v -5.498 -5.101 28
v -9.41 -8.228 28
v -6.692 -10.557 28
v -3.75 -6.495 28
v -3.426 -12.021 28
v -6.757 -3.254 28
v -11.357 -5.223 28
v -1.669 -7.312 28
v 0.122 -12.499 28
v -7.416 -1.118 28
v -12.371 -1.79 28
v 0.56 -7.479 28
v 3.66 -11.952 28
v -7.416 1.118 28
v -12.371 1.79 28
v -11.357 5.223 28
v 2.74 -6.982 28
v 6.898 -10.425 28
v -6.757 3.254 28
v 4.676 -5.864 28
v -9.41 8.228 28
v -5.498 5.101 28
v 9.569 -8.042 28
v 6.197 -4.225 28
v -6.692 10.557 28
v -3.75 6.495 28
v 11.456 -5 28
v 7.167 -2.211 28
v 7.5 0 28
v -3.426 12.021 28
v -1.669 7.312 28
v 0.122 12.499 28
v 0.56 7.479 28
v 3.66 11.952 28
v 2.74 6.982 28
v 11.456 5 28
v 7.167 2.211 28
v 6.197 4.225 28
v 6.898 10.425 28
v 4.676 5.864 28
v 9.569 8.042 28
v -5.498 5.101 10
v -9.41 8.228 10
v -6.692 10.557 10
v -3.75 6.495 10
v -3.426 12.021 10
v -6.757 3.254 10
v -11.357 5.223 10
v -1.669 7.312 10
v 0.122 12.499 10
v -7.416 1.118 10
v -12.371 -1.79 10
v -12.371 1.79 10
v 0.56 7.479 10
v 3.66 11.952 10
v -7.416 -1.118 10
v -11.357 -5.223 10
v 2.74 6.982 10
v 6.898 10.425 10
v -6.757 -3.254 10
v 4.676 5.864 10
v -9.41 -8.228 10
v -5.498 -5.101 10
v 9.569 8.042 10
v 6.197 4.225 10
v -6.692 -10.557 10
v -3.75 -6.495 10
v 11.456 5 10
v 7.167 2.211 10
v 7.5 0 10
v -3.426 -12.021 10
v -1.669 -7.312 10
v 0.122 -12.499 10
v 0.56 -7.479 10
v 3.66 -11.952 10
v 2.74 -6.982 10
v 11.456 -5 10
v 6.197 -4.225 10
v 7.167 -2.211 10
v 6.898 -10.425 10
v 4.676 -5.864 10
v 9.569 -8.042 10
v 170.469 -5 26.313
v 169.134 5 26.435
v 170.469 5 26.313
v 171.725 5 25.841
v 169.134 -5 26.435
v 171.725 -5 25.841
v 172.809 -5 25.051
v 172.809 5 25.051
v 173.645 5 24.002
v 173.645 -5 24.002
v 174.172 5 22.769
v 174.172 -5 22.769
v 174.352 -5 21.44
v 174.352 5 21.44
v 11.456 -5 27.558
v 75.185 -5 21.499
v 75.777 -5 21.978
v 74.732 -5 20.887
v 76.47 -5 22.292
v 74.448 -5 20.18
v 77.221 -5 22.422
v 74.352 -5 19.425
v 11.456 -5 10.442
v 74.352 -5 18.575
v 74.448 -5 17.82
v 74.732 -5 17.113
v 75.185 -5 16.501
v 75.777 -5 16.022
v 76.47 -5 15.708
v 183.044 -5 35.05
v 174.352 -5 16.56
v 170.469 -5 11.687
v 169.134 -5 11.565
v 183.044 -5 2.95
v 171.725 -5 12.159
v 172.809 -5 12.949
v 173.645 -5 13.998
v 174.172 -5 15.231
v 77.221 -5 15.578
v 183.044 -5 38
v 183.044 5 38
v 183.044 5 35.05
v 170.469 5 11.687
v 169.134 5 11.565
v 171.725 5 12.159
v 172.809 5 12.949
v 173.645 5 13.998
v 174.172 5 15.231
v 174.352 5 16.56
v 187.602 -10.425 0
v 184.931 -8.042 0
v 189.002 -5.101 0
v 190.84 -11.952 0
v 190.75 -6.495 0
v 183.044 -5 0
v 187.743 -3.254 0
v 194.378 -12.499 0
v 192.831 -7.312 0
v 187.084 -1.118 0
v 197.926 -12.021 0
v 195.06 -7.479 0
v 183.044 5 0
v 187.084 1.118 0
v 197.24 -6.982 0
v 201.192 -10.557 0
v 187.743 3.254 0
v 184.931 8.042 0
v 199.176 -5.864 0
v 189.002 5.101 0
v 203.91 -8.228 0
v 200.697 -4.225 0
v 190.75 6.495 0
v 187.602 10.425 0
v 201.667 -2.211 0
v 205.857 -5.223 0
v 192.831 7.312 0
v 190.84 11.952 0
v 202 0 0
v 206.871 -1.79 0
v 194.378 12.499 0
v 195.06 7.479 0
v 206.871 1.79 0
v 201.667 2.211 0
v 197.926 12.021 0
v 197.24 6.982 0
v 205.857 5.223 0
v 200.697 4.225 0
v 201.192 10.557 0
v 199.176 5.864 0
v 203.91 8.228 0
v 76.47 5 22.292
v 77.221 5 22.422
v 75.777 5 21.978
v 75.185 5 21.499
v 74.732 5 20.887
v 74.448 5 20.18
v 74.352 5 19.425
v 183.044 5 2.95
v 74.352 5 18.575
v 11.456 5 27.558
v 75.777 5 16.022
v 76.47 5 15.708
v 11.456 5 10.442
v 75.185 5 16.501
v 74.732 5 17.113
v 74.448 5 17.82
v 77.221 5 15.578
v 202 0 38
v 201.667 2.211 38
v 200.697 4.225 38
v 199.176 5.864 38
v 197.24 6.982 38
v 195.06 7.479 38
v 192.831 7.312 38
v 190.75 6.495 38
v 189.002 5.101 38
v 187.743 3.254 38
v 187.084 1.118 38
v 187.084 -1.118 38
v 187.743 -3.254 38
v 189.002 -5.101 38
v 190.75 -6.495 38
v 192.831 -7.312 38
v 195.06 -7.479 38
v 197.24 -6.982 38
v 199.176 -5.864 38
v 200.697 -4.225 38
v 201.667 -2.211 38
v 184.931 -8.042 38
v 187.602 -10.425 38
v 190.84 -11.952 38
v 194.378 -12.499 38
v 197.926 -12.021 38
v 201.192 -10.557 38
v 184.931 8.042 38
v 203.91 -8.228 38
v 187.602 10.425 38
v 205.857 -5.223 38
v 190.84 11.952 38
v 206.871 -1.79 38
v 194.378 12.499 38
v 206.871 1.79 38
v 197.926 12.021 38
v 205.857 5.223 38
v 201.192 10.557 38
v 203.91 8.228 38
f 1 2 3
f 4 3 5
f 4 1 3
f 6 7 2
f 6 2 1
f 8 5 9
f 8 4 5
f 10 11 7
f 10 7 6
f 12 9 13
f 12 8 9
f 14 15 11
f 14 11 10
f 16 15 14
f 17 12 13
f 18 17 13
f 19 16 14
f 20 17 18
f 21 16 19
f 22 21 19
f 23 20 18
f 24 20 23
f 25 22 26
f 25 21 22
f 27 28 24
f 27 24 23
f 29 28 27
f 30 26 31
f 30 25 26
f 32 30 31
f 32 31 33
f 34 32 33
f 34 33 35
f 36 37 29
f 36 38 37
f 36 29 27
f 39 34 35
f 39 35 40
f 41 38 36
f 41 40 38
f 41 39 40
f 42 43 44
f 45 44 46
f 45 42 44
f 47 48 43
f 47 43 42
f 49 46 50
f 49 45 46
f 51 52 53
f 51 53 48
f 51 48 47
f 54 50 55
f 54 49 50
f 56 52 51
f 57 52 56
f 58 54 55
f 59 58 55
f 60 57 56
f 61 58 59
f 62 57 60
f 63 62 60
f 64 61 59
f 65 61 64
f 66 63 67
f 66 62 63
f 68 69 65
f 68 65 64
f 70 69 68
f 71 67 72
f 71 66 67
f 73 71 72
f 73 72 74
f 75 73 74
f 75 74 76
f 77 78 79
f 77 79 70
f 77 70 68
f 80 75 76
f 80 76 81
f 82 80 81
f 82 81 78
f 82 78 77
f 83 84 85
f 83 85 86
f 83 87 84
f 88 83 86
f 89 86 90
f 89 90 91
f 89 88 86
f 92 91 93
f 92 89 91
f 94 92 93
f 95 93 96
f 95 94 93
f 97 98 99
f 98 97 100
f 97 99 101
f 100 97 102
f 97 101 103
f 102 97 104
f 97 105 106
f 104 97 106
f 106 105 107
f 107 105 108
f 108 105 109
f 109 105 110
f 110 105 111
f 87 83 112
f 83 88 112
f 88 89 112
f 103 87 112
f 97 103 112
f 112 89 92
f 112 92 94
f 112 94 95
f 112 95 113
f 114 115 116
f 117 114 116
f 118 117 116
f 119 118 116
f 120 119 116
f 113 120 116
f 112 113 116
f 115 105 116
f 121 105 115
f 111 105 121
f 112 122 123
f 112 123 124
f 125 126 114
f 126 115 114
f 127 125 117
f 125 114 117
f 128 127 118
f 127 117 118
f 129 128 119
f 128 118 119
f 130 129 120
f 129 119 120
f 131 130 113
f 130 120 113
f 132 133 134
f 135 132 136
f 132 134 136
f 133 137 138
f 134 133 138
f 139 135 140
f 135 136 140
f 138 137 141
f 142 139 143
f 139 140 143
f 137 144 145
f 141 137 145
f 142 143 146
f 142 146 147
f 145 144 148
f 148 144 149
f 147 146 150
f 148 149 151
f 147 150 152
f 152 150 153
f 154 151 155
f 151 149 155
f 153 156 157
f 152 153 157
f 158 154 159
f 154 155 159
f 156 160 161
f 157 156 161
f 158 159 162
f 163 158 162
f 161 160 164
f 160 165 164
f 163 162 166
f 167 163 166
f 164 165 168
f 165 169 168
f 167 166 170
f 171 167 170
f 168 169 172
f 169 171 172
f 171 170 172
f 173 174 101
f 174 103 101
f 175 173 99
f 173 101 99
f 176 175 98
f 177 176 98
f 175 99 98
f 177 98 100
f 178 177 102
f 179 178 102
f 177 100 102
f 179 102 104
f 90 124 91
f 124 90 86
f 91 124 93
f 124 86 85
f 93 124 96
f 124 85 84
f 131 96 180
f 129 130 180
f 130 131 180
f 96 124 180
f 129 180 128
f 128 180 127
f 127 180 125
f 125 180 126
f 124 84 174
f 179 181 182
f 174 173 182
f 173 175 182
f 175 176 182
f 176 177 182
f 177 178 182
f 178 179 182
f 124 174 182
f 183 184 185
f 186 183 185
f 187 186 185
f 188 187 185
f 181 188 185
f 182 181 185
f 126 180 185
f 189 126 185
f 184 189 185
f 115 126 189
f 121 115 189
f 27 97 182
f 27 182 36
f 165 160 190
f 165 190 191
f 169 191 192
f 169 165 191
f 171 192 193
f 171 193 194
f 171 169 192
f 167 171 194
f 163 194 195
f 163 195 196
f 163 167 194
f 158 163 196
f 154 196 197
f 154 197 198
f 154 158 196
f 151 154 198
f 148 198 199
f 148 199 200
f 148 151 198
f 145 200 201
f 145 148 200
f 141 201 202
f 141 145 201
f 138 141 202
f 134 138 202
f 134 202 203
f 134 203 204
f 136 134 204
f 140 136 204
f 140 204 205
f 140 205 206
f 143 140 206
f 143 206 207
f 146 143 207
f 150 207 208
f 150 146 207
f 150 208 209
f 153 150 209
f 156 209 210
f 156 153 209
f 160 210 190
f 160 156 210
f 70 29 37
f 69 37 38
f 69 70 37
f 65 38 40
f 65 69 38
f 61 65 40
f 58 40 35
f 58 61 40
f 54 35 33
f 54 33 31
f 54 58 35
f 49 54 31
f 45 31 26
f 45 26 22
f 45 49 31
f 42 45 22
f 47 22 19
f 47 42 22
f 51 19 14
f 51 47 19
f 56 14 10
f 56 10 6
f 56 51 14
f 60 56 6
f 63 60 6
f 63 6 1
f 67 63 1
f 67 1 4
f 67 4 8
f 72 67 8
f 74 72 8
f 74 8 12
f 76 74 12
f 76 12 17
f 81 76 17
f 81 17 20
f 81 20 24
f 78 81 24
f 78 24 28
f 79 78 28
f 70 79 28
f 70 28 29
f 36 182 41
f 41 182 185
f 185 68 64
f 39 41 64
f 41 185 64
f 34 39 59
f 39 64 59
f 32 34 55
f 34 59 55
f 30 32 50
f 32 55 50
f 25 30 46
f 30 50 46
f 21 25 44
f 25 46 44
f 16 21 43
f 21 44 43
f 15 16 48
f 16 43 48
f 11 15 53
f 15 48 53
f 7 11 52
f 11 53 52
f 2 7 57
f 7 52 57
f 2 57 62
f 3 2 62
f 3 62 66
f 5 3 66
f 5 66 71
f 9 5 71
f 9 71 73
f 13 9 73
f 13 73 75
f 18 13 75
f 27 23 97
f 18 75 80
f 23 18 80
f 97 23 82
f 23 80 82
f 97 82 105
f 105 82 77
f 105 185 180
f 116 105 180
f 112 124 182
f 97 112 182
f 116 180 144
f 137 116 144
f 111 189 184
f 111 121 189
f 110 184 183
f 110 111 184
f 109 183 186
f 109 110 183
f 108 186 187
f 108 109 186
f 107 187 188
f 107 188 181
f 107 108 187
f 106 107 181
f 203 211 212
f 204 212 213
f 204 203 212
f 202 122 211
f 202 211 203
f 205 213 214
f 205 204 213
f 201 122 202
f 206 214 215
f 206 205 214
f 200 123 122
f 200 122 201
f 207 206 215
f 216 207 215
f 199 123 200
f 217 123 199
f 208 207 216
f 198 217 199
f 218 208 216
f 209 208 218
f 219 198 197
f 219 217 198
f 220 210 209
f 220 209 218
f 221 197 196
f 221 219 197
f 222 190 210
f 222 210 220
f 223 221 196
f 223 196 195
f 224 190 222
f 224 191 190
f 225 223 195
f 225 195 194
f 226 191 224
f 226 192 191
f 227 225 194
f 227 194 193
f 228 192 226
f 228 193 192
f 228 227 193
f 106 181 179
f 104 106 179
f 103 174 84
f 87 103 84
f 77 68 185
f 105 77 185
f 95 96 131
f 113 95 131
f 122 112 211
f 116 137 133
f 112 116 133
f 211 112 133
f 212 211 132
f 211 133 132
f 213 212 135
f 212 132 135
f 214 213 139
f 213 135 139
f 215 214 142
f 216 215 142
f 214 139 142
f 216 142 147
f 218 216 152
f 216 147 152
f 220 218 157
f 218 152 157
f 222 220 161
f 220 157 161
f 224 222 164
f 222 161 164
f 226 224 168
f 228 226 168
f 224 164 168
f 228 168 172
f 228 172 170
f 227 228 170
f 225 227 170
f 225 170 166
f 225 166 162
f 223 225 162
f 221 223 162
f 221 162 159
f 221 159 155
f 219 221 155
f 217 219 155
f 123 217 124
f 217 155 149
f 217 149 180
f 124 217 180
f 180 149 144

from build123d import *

# Parameters (mm, degrees)
SKETCH1_R               = 7.5
BOSS_EXTRUDE1_DEPTH     = 38
SKETCH2_W               = 23.956439237
SKETCH2_H               = 10
CUT_EXTRUDE1_DEPTH      = 8.5
CUT_EXTRUDE1_DEPTH_BACK = 18.5
FILLET1_R               = 3
FILLET2_R               = 5


with BuildPart() as part:
    # Sketch1 → Boss-Extrude1 (new body)
    with BuildSketch(Plane.XY):
        with BuildLine():
            Line((183.043560763, 5), (11.456439237, 5))
            ThreePointArc((11.456439237, 5), (-12.5, 0), (11.456439237, -5))
            Line((11.456439237, -5), (183.043560763, -5))
            ThreePointArc((183.043560763, -5), (207, 0), (183.043560763, 5))
        make_face()
        Circle(SKETCH1_R, mode=Mode.SUBTRACT)
        with Locations((194.5, 0)):
            Circle(SKETCH1_R, mode=Mode.SUBTRACT)
    extrude(amount=BOSS_EXTRUDE1_DEPTH)

    # Sketch2 → Cut-Extrude1 (cut, two sides)
    with BuildSketch(Plane(origin=(0, 5, 0), x_dir=(1, 0, 0), z_dir=(0, 1, 0))) as cut_extrude1_sk:
        Polygon((11.456439237, -27.558152076), (11.456439237, -28), (11.456439237, -38), (183.043560763, -38), (183.043560763, -35.049807592), align=None)
        with Locations((-0.521780381, -33)):
            Rectangle(SKETCH2_W, SKETCH2_H)
        with Locations((-0.521780381, -5)):
            Rectangle(SKETCH2_W, SKETCH2_H)
        Polygon((183.043560763, 0), (11.456439237, 0), (11.456439237, -10), (11.456439237, -10.441847924), (183.043560763, -2.950192408), align=None)
        Polygon((74.351780381, -15.703399507), (74.351780381, -22.296600493), (174.351780381, -26.662694784), (174.351780381, -11.337305216), align=None)
    extrude(amount=CUT_EXTRUDE1_DEPTH, mode=Mode.SUBTRACT)
    extrude(cut_extrude1_sk.sketch, amount=-CUT_EXTRUDE1_DEPTH_BACK, mode=Mode.SUBTRACT)

    # Fillet1
    fillet1_edges = [part.edges().sort_by_distance(p)[0] for p in [
        (74.351780381, 0, 22.296600493),
        (74.351780381, 0, 15.703399507),
    ]]
    fillet(fillet1_edges, radius=FILLET1_R)

    # Fillet2
    fillet2_edges = [part.edges().sort_by_distance(p)[0] for p in [
        (174.351780381, 0, 11.337305216),
        (174.351780381, 0, 26.662694784),
    ]]
    fillet(fillet2_edges, radius=FILLET2_R)


solid = part.part
